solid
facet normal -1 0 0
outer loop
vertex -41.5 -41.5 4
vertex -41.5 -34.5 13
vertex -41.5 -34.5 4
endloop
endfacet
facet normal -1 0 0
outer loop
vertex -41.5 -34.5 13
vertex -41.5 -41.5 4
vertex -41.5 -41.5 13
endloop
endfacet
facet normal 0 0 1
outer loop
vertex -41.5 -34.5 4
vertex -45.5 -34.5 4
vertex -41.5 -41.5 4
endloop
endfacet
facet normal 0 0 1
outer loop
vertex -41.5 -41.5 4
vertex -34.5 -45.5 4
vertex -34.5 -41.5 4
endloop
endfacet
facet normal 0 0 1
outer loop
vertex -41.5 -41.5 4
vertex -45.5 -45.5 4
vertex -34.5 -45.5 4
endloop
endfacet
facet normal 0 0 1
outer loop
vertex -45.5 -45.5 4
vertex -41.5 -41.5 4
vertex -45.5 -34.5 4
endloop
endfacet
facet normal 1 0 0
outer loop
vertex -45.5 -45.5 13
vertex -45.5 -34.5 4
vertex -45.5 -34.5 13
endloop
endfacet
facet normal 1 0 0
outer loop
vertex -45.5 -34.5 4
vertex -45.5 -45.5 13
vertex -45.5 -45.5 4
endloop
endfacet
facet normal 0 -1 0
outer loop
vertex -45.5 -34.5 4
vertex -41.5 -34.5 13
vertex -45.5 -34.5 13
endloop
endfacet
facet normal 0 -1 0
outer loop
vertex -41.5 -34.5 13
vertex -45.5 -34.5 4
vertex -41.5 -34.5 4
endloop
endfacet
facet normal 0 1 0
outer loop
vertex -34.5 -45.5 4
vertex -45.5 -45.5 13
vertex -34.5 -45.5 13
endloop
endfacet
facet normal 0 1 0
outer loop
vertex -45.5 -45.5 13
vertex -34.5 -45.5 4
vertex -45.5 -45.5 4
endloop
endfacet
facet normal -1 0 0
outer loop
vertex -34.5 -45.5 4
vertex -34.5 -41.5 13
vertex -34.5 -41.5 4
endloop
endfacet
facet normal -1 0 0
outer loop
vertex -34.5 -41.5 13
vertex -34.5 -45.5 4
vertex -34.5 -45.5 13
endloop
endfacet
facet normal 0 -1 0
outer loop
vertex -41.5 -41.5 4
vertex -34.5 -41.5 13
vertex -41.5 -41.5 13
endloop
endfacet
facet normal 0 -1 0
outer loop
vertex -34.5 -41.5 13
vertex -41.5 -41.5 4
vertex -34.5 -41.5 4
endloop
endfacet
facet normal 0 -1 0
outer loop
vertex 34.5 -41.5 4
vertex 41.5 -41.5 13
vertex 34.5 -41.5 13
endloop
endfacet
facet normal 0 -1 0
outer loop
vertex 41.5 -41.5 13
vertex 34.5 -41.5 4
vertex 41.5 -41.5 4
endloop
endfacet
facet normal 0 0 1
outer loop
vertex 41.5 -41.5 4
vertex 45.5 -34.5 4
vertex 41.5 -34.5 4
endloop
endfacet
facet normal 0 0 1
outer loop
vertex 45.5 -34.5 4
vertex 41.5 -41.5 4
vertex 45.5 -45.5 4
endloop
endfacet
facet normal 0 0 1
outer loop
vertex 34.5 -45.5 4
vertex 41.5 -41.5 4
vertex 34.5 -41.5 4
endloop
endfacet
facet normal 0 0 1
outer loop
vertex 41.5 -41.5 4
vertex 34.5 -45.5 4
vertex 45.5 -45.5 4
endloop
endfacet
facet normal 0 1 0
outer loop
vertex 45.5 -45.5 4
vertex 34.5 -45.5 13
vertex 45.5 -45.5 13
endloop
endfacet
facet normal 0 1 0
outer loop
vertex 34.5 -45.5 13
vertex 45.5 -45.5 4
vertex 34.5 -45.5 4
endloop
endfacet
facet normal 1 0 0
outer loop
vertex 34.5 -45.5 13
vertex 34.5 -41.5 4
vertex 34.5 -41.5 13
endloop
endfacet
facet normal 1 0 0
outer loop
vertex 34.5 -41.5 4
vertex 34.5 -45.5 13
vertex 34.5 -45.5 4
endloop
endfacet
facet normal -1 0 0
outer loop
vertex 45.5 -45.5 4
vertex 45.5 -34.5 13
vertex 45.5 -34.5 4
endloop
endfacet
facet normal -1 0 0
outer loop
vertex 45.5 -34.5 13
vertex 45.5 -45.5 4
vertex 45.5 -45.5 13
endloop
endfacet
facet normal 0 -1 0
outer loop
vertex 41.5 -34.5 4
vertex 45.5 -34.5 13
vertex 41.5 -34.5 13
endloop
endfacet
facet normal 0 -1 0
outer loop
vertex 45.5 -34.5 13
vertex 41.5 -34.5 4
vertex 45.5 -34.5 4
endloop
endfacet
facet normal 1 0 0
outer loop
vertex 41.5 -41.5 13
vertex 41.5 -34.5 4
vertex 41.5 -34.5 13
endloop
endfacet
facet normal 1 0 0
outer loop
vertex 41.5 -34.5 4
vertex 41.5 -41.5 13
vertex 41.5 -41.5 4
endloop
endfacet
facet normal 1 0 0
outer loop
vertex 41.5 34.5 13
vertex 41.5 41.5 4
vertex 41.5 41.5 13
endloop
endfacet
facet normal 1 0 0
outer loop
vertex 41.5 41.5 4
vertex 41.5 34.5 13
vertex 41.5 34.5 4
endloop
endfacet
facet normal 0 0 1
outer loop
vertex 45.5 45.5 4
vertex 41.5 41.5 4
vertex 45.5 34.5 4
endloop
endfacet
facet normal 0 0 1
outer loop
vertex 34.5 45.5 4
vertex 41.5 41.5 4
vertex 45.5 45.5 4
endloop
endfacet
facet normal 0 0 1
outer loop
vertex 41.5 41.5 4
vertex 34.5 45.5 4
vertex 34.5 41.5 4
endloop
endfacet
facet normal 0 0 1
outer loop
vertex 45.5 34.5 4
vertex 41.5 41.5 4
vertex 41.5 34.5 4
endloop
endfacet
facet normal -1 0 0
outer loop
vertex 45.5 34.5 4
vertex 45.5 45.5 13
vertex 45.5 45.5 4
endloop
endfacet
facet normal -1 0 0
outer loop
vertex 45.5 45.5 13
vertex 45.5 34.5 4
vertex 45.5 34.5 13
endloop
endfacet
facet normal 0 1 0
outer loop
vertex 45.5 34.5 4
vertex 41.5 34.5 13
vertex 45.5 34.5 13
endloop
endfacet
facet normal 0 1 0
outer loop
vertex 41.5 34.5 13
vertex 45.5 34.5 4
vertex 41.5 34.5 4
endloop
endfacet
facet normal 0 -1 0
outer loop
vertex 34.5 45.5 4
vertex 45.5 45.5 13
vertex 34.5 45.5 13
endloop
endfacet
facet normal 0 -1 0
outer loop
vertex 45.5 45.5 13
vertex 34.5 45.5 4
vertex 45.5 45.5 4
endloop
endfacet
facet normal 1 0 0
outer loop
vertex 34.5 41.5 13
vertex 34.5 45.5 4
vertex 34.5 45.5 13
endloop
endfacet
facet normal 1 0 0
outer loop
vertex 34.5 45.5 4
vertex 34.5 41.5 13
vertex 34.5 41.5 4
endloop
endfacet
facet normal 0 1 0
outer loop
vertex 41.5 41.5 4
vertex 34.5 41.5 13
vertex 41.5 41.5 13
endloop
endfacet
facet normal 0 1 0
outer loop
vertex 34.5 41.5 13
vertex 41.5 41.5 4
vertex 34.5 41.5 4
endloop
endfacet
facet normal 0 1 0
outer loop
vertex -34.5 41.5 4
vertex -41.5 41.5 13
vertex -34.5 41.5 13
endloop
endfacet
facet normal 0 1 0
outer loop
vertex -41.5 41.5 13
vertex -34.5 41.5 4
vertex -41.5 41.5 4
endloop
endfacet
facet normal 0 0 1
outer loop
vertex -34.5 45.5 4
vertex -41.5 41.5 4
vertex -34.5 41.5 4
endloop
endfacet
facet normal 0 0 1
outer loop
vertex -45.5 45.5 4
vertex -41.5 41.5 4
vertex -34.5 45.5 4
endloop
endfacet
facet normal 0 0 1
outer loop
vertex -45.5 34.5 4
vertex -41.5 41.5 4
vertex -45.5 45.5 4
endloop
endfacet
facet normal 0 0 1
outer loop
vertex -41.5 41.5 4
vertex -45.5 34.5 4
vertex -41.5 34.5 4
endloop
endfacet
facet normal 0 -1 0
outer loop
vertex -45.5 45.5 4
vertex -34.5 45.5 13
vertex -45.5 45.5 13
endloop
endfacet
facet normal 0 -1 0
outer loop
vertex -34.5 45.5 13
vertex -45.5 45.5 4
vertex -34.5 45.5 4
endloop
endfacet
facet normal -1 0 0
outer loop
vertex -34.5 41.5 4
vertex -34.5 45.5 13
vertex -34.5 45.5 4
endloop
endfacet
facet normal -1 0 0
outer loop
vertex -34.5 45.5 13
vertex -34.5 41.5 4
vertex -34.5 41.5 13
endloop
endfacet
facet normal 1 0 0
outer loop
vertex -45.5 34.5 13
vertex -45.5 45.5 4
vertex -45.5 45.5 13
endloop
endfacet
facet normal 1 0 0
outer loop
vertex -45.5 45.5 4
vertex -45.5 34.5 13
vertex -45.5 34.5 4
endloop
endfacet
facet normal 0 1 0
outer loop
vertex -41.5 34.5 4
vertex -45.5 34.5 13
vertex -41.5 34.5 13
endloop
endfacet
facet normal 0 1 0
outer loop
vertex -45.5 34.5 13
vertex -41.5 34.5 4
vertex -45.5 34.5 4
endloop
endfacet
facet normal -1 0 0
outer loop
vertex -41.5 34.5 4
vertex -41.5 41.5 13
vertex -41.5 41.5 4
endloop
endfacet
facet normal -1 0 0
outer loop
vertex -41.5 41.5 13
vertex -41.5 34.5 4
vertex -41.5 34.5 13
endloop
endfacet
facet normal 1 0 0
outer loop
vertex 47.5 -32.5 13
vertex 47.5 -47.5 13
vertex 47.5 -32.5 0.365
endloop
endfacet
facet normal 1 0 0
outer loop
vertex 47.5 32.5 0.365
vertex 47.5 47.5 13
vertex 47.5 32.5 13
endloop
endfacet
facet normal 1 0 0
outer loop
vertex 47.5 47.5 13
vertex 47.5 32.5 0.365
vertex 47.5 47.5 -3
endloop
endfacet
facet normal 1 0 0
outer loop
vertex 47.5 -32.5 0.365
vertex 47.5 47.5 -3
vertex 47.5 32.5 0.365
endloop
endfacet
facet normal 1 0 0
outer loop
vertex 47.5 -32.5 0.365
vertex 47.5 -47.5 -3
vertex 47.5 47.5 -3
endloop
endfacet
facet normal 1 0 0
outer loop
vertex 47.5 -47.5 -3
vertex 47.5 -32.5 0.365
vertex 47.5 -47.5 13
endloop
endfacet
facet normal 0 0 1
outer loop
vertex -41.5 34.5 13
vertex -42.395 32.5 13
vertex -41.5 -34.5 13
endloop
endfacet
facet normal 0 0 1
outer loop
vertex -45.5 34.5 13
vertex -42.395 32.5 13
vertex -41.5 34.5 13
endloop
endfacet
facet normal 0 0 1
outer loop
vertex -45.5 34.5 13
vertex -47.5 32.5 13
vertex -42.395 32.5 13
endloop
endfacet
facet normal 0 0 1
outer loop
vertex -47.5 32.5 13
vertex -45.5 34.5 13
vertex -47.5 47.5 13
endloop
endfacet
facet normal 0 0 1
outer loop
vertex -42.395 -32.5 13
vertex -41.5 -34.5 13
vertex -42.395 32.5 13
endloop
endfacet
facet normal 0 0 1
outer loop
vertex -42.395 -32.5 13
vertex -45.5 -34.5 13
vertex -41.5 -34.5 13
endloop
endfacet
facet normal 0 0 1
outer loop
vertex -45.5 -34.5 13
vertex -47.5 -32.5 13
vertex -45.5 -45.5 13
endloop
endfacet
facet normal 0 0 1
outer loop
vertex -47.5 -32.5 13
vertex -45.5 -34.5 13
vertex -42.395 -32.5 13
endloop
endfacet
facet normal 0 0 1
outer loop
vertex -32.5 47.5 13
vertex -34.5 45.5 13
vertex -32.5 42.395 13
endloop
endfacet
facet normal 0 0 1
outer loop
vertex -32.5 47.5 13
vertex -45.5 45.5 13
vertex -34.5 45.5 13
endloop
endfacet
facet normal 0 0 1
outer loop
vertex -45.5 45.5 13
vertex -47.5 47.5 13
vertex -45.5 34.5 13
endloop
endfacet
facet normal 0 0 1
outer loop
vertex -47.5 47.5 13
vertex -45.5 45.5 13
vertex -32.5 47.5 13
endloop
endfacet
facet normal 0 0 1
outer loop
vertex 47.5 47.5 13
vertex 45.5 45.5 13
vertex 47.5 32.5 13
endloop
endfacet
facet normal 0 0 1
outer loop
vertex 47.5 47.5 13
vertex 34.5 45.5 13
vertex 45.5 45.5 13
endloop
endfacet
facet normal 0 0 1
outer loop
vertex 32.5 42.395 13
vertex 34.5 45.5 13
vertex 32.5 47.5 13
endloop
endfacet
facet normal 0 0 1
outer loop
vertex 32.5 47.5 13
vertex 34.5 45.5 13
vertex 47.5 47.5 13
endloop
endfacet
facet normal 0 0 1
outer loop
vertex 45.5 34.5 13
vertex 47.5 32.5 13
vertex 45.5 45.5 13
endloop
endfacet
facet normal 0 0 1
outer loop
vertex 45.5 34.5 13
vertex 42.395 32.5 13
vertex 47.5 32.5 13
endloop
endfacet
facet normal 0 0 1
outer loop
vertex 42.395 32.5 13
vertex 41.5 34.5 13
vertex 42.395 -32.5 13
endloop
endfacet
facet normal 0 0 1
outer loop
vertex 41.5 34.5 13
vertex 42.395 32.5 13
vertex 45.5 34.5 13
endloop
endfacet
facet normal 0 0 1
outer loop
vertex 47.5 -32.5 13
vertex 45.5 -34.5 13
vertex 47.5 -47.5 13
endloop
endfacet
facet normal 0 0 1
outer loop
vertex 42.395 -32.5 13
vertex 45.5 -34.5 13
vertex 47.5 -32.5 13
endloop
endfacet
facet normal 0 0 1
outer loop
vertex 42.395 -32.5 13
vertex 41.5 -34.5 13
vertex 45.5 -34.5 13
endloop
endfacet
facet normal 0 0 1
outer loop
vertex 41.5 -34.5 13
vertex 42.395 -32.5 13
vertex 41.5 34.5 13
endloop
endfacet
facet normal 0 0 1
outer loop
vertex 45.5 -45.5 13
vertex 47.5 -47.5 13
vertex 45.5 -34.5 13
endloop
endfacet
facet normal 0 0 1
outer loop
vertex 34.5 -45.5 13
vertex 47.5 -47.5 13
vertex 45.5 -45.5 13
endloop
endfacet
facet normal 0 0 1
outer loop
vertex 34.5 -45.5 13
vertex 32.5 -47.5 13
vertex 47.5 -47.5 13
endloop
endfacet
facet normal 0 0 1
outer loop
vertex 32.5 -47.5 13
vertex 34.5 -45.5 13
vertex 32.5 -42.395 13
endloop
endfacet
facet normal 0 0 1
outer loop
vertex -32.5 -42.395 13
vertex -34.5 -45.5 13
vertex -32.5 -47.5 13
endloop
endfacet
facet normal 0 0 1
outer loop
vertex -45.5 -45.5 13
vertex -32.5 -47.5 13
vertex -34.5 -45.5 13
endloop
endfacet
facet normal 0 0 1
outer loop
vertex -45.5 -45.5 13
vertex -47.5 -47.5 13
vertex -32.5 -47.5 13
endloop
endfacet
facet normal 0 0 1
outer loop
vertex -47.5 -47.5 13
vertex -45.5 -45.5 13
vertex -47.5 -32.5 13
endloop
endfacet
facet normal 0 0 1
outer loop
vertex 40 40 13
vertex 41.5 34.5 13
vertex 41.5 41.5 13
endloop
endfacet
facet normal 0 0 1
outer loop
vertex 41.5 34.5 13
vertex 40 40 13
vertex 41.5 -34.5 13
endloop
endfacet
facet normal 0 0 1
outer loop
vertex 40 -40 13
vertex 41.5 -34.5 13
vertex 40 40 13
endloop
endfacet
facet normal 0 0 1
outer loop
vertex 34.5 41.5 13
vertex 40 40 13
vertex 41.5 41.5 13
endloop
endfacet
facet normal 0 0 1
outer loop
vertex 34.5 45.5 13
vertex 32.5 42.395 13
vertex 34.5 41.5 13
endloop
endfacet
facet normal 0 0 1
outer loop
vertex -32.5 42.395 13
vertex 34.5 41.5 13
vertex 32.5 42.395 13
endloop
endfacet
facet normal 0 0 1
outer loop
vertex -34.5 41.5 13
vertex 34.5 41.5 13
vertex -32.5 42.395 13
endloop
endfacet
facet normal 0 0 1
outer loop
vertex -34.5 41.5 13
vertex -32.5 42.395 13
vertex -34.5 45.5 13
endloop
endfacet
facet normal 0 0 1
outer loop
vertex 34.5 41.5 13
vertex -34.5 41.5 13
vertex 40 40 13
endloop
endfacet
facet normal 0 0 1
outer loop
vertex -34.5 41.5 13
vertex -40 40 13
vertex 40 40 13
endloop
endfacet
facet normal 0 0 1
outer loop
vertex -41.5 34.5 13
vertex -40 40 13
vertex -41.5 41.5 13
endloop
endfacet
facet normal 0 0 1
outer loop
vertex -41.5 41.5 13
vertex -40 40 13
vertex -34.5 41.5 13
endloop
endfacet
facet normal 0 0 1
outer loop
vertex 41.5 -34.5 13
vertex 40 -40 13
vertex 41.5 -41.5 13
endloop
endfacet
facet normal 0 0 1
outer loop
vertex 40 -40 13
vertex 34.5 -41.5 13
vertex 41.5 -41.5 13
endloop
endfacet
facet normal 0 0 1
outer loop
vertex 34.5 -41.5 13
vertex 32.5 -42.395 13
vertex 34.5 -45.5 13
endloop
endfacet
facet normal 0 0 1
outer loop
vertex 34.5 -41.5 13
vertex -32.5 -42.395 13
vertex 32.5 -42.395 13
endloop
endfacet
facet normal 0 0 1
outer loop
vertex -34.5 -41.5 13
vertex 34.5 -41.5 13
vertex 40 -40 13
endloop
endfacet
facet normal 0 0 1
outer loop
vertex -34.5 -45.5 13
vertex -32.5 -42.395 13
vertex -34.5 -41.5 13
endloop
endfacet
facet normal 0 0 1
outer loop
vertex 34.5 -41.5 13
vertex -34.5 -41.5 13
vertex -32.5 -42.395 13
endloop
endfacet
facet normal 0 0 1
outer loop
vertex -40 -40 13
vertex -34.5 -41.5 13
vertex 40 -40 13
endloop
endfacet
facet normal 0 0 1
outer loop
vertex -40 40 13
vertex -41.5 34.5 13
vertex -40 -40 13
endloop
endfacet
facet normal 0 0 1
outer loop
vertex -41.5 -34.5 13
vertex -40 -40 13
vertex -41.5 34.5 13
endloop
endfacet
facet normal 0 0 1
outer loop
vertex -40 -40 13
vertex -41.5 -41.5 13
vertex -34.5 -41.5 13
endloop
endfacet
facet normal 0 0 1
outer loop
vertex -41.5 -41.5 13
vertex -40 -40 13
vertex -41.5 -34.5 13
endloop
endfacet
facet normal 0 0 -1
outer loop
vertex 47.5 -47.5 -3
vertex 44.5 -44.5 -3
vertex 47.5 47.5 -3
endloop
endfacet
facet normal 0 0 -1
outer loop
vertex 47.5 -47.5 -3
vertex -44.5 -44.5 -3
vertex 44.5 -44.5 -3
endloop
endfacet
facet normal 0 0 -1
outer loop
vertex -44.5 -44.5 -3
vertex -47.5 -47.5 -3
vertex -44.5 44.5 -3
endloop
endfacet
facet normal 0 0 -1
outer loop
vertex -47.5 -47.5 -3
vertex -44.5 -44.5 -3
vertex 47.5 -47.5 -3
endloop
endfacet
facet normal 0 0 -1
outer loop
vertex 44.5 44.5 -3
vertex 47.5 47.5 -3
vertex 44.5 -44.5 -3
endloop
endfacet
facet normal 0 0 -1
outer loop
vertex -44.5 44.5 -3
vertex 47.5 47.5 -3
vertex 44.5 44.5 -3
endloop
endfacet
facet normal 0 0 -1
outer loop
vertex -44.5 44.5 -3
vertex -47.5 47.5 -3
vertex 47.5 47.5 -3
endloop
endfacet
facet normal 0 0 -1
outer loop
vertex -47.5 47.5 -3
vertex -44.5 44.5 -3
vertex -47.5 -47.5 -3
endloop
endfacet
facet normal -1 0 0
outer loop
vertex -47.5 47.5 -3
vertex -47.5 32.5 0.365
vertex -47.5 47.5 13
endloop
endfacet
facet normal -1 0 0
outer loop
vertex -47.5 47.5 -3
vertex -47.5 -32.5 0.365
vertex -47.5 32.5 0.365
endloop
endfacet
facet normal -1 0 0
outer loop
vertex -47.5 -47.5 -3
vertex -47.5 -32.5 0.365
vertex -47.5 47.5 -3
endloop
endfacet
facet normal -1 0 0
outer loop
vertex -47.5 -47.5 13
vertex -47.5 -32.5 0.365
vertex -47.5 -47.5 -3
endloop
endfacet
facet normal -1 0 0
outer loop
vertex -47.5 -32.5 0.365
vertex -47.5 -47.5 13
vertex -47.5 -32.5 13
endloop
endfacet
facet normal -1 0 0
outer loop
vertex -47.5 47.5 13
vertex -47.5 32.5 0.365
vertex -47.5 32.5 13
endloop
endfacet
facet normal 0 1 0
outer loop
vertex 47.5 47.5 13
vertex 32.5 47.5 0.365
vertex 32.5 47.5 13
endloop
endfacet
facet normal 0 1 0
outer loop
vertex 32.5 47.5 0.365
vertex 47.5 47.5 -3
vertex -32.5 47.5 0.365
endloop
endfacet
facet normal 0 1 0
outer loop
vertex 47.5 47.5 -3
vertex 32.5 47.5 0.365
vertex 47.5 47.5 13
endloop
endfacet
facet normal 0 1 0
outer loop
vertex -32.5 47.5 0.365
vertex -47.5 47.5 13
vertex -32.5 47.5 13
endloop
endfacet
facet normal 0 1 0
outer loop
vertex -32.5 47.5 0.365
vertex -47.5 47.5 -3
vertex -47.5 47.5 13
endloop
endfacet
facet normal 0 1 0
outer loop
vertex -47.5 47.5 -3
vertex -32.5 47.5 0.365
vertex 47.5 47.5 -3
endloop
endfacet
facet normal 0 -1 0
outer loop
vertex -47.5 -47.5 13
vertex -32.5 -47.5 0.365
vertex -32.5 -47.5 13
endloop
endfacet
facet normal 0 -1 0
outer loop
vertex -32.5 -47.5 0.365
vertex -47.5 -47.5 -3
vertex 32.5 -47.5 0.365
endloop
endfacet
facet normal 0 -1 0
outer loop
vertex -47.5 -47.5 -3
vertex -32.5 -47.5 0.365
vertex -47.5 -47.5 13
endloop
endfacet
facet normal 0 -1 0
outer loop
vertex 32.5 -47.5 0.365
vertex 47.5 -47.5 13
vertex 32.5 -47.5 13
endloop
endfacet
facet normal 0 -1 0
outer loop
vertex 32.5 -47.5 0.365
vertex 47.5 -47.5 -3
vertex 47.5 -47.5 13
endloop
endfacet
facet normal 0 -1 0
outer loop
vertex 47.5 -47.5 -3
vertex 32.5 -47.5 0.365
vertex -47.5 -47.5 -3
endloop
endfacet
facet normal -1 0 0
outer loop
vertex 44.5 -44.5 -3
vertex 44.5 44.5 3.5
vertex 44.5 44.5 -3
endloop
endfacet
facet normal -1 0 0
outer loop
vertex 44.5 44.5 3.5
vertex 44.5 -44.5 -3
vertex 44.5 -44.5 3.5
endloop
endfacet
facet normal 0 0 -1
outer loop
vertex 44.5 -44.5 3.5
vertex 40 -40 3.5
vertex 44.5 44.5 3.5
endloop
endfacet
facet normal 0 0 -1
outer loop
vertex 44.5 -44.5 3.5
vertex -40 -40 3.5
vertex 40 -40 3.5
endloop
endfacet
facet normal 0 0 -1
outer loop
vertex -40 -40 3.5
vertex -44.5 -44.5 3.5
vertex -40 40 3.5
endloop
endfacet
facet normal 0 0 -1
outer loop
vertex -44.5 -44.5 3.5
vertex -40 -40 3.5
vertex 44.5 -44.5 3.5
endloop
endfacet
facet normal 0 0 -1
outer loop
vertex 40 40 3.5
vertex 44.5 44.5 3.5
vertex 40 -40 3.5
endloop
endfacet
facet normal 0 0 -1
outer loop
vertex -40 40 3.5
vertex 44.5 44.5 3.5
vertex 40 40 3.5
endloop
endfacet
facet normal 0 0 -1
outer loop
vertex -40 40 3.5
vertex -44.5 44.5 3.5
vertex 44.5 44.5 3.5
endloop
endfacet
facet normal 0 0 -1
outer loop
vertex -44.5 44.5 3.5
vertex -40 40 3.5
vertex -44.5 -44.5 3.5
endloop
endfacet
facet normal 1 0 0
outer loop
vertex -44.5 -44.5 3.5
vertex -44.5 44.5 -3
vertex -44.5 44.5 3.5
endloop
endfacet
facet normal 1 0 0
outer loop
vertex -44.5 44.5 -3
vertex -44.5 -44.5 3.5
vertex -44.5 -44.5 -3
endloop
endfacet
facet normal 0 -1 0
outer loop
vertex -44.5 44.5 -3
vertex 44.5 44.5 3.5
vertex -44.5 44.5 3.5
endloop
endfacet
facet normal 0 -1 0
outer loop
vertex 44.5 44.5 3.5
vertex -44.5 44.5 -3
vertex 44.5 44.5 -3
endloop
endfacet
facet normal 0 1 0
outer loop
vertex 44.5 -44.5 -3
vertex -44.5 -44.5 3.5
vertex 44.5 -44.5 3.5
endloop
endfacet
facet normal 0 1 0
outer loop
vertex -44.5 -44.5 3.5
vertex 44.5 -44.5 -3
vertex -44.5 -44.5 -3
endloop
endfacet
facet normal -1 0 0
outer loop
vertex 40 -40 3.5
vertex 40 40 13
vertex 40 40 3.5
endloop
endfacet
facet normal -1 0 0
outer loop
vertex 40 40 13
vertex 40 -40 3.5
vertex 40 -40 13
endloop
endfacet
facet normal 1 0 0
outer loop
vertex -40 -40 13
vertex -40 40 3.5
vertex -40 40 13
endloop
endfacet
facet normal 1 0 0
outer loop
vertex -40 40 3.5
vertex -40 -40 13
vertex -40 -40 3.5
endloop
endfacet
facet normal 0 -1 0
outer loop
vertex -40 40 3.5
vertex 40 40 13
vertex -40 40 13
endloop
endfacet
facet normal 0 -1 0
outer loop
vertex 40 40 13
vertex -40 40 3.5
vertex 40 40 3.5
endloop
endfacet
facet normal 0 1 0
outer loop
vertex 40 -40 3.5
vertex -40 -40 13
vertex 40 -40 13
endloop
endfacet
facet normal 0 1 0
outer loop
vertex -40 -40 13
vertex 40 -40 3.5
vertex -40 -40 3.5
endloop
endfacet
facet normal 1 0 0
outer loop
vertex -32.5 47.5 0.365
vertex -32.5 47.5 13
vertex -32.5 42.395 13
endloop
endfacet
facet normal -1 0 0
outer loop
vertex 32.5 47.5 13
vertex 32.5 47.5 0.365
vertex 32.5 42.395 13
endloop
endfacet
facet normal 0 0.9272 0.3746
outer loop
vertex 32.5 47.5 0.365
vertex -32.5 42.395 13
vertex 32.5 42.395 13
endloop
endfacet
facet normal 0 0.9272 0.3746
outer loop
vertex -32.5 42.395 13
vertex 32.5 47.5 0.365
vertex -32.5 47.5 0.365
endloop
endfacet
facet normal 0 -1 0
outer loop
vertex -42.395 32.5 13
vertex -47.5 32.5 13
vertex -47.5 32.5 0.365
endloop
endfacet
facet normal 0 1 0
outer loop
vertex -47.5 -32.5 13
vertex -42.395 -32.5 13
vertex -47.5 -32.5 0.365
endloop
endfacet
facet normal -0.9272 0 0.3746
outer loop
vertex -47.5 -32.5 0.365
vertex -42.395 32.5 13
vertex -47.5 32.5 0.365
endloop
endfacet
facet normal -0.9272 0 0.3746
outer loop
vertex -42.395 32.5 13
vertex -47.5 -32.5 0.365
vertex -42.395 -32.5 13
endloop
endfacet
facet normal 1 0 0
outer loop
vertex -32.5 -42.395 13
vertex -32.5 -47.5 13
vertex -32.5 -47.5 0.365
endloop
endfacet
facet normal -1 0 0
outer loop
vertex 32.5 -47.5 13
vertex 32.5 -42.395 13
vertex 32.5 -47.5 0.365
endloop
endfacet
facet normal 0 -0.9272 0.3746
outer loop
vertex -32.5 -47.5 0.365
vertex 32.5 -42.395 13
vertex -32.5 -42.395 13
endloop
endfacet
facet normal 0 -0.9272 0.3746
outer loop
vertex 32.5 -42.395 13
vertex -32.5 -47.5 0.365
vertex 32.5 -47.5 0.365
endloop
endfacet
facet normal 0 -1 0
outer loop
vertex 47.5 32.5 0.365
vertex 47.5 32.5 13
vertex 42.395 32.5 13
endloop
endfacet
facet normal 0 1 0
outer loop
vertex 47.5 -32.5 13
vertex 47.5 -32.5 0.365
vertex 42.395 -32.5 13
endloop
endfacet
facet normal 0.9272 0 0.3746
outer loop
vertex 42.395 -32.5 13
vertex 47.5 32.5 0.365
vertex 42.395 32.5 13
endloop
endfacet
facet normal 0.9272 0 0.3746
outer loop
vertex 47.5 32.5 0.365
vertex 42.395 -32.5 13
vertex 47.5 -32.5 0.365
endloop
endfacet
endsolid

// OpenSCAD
module leg(){
    cube([4,11,11]);
    cube([11,4,11]);
}

difference(){
difference(){
    translate([0,0,5]) cube([95,95,16],center=true);
    cube([89,89,7],center=true); 
    color("red")translate([0,0,4]) cube([80,80,50], center=true);
    translate([-45.5,-45.5,4]) leg();
    translate([45.5,-45.5,4]) rotate([0,0,90]) leg();
    translate([45.5,45.5,4]) rotate([0,0,180]) leg();
    translate([-45.5,45.5,4]) rotate([0,0,-90]) leg();
}

translate([0,49,10]) rotate([22,0,0]) cube([65,10,30],center=true);
rotate([0,0,90]) translate([0,49,10]) rotate([22,0,0]) cube([65,10,30],center=true);
rotate([0,0,180]) translate([0,49,10]) rotate([22,0,0]) cube([65,10,30],center=true);
rotate([0,0,270]) translate([0,49,10]) rotate([22,0,0]) cube([65,10,30],center=true);
}
